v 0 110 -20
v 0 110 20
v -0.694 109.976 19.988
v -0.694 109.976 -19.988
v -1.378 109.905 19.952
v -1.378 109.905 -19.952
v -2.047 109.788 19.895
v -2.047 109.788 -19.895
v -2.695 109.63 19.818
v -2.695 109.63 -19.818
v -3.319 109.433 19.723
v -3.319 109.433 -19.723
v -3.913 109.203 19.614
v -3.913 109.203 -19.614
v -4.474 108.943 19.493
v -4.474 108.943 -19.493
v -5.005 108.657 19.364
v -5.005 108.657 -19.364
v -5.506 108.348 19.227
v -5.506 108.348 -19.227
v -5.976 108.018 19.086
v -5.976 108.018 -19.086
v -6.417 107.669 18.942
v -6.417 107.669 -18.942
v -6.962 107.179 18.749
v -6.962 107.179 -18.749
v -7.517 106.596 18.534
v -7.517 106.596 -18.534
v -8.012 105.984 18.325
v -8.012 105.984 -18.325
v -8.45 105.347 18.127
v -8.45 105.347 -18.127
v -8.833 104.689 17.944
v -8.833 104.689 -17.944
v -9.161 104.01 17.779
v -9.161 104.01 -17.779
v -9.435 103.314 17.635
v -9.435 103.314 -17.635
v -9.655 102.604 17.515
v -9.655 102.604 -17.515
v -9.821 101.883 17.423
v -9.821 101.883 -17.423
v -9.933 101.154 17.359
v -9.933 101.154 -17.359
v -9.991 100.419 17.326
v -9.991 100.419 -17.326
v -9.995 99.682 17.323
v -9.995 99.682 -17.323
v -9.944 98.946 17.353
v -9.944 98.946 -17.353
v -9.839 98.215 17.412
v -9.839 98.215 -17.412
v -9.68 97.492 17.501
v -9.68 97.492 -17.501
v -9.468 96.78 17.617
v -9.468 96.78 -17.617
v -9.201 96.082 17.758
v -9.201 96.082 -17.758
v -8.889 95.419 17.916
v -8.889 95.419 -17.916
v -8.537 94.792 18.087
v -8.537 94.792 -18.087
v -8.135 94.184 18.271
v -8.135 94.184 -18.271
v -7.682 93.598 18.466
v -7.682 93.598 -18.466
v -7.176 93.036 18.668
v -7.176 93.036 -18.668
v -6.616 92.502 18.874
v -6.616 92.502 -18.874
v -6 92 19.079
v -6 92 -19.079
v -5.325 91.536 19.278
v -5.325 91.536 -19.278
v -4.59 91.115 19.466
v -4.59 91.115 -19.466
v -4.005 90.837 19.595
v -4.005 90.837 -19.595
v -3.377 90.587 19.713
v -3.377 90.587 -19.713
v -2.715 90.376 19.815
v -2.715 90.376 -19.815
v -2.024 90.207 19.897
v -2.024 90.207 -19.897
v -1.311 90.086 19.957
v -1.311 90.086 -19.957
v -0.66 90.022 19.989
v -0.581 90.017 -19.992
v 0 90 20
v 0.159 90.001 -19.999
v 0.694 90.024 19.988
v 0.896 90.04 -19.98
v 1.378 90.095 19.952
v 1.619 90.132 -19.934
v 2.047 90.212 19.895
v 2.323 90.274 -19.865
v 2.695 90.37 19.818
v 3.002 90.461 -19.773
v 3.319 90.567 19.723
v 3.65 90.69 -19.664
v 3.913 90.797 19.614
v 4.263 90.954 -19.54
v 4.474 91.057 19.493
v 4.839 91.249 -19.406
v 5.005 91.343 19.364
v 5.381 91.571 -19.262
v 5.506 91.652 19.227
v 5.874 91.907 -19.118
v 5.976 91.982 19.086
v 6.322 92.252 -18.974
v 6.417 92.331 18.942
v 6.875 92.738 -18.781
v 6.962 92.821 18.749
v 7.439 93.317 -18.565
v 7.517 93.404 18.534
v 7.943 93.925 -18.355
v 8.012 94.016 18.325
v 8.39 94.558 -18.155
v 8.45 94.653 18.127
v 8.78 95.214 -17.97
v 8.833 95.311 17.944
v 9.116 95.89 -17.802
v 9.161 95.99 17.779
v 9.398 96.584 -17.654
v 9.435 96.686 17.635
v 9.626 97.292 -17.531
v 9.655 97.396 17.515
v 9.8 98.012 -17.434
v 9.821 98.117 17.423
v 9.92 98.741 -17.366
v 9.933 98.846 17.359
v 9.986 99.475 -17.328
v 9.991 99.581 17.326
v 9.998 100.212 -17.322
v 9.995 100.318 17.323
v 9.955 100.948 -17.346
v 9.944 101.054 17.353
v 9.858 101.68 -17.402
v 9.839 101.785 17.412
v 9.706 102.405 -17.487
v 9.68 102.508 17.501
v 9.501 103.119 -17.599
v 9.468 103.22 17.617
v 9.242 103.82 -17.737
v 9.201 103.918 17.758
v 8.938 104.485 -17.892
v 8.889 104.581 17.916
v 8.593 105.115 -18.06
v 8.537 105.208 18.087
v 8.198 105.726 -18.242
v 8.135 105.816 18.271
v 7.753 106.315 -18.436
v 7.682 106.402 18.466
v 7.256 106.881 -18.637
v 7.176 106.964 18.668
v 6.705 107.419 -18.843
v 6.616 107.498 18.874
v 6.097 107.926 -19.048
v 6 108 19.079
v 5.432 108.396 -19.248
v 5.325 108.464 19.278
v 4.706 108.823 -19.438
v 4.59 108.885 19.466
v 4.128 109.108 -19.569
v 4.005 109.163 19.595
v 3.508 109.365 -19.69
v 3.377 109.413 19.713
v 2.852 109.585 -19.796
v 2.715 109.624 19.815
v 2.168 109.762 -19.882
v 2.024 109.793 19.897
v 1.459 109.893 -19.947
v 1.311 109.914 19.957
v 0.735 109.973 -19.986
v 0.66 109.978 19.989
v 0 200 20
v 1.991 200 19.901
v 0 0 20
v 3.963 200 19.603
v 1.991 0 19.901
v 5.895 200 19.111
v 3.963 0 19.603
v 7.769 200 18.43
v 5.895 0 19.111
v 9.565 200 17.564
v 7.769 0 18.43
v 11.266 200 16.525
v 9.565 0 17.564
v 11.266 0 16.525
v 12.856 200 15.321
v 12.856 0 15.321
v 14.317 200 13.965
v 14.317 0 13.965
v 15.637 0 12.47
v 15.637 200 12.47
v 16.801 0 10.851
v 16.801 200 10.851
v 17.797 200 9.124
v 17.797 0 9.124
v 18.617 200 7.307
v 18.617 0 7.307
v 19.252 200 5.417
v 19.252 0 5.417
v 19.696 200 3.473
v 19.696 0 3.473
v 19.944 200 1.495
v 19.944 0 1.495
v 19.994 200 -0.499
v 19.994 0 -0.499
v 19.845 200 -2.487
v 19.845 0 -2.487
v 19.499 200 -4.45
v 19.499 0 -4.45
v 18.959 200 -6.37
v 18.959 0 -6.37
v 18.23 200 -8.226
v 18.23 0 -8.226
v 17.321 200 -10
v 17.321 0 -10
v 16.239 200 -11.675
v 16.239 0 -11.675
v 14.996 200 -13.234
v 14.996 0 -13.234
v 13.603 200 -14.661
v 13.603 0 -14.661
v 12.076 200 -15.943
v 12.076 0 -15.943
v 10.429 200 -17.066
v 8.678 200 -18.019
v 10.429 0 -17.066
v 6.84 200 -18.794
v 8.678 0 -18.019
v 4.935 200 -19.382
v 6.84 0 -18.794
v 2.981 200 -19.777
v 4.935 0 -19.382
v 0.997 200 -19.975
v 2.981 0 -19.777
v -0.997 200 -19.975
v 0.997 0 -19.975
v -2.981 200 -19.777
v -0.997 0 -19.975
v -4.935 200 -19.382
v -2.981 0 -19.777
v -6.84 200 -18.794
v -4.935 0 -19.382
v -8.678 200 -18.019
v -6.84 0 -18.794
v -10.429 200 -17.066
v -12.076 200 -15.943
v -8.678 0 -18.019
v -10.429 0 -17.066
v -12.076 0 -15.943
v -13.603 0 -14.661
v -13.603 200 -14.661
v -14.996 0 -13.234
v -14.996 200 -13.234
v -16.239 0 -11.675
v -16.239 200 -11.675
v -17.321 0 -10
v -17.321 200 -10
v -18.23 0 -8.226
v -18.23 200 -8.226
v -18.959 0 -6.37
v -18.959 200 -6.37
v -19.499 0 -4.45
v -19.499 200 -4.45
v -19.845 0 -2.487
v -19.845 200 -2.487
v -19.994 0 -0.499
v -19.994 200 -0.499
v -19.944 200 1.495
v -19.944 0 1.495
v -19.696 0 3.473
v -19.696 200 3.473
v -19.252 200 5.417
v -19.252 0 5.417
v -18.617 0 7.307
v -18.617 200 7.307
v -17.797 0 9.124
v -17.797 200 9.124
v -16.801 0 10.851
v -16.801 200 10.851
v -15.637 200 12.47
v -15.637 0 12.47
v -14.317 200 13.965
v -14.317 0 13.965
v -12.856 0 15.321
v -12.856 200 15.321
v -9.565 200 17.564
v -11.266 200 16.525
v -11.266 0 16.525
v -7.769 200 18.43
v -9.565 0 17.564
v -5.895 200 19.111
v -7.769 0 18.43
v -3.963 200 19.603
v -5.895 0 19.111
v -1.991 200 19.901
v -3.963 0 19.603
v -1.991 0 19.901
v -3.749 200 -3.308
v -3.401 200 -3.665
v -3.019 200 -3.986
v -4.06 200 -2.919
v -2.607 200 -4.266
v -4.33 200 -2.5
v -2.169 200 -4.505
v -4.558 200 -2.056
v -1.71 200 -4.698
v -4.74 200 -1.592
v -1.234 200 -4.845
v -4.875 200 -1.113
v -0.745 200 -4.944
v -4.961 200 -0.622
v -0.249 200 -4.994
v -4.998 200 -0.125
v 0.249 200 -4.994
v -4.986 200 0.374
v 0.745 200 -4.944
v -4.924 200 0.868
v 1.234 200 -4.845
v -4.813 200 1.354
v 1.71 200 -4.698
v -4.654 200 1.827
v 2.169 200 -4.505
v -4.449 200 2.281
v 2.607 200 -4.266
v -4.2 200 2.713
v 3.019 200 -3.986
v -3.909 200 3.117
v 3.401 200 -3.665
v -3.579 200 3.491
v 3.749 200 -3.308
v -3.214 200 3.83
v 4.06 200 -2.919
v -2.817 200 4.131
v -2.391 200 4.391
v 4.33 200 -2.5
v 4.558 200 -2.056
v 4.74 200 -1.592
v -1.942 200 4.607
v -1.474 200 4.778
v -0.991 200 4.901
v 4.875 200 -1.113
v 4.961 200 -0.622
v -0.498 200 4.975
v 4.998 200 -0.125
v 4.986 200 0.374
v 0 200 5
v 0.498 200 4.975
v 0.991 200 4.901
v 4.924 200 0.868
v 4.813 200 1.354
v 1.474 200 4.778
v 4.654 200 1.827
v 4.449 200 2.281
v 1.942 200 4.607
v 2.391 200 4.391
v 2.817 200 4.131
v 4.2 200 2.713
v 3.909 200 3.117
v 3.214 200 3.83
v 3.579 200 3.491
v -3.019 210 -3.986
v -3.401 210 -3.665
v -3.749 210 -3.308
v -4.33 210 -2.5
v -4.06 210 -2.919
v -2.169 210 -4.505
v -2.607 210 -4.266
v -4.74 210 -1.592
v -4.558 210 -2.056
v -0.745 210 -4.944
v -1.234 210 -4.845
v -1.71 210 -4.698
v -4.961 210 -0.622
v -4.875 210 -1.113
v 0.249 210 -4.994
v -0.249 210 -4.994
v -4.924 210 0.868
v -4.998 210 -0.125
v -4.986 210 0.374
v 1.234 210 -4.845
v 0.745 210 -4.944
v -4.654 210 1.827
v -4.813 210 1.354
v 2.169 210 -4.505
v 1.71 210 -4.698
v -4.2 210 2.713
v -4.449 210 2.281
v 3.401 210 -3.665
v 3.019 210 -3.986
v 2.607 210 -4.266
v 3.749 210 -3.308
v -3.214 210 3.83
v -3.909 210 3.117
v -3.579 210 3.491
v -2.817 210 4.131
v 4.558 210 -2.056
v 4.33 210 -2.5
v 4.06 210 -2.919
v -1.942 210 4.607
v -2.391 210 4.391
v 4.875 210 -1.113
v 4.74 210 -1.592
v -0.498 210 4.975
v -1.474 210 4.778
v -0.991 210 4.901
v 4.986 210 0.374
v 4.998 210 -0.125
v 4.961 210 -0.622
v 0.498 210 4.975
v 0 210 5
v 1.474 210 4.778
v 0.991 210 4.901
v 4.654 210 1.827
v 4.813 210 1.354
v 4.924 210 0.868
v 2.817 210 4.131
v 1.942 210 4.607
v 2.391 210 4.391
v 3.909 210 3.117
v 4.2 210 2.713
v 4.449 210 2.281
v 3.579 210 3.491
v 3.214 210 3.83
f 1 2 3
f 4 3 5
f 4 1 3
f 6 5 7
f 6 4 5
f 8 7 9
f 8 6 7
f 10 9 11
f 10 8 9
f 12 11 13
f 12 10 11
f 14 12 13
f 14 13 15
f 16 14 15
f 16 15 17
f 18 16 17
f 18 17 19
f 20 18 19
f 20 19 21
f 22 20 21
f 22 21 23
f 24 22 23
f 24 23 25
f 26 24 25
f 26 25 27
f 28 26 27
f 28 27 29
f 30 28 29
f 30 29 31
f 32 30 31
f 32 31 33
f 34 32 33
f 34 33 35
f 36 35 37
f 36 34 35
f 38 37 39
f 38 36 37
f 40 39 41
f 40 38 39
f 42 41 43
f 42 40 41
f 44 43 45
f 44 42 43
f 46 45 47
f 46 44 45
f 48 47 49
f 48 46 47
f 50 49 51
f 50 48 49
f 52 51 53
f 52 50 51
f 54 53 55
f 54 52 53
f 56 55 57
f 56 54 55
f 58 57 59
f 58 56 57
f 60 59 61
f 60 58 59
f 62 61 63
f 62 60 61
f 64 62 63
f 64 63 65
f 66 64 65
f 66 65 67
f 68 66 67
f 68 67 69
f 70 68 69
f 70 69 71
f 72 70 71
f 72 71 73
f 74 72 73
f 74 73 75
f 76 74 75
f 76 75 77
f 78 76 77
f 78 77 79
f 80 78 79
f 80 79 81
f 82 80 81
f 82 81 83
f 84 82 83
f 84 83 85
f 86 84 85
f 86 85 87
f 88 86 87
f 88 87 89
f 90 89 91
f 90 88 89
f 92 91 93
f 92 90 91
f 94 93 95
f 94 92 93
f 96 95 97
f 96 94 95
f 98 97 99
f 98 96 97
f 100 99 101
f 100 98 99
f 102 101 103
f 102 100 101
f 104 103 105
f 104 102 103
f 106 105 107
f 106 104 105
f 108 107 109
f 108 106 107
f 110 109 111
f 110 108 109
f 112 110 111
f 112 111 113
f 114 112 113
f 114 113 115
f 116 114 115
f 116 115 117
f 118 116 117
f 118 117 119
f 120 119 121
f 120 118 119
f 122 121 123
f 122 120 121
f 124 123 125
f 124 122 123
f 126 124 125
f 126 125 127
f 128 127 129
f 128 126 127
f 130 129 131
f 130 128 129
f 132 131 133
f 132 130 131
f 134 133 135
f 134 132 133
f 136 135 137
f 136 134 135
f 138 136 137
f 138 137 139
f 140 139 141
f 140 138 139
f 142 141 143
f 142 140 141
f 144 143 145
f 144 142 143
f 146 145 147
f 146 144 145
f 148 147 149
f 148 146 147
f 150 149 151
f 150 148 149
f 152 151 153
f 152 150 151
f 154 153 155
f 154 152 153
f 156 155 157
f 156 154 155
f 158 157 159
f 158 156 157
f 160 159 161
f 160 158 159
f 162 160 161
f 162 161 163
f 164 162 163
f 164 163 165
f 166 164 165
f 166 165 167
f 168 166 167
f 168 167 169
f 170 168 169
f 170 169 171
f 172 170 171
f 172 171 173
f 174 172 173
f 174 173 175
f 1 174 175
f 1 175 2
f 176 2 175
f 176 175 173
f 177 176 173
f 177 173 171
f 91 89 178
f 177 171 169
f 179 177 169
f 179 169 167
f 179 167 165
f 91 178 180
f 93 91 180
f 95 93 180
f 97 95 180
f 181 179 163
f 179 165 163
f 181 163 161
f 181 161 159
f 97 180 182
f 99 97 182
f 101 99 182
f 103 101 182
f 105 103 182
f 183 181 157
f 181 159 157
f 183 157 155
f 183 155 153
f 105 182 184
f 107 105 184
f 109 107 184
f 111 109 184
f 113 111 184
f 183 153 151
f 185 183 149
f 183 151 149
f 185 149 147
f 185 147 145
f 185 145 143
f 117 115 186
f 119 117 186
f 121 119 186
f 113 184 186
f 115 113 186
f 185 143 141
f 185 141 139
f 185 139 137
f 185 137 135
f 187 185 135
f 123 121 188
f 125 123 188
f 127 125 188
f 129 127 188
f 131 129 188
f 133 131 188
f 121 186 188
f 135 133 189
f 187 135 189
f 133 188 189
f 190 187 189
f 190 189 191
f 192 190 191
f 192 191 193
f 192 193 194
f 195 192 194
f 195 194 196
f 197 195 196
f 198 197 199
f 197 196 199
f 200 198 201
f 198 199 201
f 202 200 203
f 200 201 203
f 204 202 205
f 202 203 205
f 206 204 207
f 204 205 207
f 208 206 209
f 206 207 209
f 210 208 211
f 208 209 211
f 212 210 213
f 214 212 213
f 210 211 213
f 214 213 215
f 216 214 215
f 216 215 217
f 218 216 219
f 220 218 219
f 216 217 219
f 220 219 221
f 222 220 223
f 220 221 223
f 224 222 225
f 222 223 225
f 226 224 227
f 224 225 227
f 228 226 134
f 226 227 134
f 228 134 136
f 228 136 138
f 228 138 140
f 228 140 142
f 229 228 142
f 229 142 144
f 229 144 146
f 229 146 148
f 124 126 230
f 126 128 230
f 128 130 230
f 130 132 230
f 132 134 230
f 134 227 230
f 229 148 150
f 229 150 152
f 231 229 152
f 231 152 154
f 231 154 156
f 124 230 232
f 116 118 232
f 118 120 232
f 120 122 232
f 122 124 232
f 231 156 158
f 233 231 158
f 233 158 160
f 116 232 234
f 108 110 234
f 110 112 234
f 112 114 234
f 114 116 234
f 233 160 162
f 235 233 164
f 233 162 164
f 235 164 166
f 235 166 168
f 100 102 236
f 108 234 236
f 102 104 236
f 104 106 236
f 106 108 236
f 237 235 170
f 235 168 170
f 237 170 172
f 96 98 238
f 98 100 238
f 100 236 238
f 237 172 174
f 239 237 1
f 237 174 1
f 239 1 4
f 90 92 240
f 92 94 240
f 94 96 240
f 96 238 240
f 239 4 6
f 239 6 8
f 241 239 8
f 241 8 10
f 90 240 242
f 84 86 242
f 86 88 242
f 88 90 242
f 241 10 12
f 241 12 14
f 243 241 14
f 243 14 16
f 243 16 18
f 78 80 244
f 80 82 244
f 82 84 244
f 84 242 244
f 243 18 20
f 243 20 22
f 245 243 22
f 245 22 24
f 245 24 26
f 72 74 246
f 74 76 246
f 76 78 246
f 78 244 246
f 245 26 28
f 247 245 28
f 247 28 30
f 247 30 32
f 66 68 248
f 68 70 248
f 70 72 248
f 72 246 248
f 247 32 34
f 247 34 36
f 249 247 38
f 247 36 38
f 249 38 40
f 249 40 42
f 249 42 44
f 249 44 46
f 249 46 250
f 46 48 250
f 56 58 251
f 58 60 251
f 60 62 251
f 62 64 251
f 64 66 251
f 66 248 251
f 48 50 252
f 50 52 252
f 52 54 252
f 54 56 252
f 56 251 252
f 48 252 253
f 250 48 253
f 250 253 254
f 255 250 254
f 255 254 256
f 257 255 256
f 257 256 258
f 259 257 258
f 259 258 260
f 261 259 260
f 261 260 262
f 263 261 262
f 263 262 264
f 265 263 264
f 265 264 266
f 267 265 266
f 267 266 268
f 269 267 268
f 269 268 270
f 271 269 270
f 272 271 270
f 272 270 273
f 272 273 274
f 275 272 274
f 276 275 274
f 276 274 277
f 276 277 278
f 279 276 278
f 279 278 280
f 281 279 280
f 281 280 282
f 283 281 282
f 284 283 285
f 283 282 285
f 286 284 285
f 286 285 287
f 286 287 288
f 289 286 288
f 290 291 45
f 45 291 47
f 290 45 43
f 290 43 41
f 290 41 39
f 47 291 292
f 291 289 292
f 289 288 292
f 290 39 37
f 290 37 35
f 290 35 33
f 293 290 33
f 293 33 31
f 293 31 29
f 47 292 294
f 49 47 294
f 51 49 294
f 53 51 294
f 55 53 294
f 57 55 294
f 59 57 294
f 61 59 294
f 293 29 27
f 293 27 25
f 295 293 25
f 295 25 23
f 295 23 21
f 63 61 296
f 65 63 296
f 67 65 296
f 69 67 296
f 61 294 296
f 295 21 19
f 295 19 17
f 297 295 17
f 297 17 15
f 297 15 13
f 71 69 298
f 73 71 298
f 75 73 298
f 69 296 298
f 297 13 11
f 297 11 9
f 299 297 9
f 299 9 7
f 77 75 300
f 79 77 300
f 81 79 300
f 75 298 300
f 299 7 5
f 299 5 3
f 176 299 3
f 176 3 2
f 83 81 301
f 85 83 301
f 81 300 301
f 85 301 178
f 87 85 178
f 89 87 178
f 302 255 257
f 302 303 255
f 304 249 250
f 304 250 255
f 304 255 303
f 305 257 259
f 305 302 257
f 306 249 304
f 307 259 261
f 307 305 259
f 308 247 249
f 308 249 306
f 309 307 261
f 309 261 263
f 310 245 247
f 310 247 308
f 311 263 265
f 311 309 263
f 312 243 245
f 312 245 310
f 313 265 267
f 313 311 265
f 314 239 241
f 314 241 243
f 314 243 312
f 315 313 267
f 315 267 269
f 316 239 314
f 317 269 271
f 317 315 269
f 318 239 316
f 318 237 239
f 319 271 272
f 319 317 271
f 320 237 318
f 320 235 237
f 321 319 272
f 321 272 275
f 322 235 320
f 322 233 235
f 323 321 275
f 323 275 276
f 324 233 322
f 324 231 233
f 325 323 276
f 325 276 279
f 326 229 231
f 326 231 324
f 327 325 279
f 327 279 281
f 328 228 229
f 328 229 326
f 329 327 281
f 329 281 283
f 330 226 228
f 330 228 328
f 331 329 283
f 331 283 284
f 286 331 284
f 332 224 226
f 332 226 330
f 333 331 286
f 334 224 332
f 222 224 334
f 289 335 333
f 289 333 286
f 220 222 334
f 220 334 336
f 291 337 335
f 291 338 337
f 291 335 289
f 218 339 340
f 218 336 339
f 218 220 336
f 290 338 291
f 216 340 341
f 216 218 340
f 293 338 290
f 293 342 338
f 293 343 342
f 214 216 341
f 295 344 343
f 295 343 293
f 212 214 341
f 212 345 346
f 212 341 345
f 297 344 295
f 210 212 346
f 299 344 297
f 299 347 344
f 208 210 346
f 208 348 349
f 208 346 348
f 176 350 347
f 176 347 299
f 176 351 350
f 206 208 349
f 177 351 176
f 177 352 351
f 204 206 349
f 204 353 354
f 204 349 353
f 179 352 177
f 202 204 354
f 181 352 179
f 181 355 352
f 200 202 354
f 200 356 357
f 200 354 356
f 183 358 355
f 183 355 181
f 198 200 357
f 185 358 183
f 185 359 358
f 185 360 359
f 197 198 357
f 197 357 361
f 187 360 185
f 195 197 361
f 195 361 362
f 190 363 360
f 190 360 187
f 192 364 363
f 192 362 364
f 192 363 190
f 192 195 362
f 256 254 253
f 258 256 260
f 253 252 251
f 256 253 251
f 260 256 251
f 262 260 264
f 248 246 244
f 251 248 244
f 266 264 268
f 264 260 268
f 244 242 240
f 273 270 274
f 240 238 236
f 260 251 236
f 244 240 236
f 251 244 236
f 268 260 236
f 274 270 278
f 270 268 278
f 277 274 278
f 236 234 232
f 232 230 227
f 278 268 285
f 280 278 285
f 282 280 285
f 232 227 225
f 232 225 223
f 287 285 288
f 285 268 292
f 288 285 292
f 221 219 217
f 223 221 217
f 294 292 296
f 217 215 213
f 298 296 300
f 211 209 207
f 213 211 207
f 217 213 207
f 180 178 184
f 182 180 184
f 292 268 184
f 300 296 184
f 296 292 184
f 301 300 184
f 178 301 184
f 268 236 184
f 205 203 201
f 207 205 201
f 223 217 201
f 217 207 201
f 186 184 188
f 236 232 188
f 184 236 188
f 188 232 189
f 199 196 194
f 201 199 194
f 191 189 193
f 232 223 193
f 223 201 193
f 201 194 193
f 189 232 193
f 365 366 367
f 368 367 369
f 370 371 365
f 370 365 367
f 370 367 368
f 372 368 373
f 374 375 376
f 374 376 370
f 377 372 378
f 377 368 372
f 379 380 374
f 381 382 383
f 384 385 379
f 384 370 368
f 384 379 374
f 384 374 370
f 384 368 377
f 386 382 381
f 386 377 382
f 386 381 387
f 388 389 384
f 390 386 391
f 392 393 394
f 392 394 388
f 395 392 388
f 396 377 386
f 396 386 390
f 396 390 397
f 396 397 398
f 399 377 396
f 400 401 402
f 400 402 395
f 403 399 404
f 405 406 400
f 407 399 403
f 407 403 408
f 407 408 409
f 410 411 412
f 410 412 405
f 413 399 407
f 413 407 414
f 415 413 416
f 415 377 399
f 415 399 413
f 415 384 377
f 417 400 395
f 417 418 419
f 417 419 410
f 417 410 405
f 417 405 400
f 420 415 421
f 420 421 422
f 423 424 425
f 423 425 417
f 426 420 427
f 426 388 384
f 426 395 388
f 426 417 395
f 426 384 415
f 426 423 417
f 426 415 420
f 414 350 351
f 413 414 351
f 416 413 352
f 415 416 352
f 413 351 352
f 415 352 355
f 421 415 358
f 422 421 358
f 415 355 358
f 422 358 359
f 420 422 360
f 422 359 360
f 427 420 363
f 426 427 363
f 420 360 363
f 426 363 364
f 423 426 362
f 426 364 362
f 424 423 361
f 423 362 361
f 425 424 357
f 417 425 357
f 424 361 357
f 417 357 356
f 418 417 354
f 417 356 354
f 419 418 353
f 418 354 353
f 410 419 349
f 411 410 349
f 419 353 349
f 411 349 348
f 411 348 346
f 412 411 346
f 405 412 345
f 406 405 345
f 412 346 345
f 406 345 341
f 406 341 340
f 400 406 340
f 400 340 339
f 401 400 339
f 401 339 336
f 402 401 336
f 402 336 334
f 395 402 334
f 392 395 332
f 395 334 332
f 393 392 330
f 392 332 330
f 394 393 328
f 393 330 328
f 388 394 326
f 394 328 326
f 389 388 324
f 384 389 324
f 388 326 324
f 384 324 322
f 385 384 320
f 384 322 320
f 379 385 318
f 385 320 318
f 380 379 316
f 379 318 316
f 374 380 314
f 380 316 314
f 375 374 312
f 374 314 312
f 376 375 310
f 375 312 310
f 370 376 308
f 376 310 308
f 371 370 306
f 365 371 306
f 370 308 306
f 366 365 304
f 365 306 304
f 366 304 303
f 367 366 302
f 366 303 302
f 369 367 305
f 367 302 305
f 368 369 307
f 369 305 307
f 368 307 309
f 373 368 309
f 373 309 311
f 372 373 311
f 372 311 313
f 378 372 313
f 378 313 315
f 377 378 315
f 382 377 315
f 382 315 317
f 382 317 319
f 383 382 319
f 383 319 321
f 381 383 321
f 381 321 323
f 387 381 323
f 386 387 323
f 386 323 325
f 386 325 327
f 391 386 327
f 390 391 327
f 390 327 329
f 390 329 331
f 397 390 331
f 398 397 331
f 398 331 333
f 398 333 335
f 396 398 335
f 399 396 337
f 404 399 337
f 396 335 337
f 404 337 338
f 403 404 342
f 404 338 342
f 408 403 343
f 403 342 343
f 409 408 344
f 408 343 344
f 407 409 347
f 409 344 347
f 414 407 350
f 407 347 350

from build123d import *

# Parameters (mm, degrees)
SKETCH1_R               = 20
BOSS_EXTRUDE1_DEPTH     = 200
CUT_EXTRUDE1_DEPTH      = 202.990098767
CUT_EXTRUDE1_DEPTH_BACK = 200
SKETCH2_R               = 10
SKETCH5_R               = 5
BOSS_EXTRUDE4_DEPTH     = 10


with BuildPart() as part:
    # Sketch1 → Boss-Extrude1 (new body)
    with BuildSketch(Plane(origin=(0, 0, 0), x_dir=(1, 0, 0), z_dir=(0, 1, 0))):
        with Locations(Location((0, 0, 0), (0, 0, 270))):
            Circle(SKETCH1_R)
    extrude(amount=BOSS_EXTRUDE1_DEPTH)

    # Sketch2 → Cut-Extrude1 (cut, two sides: drawn at the far end of the back side and taken through both)
    with BuildSketch(Plane.XY.offset(-CUT_EXTRUDE1_DEPTH_BACK)):
        with Locations(Location((0, 100, 0), (0, 0, 90))):
            Circle(SKETCH2_R)
    extrude(amount=CUT_EXTRUDE1_DEPTH + CUT_EXTRUDE1_DEPTH_BACK, mode=Mode.SUBTRACT)

    # Sketch5 → Boss-Extrude4 (add)
    with BuildSketch(Plane(origin=(0, 200, 0), x_dir=(1, 0, 0), z_dir=(0, 1, 0))):
        with Locations(Location((0, 0, 0), (0, 0, 270))):
            Circle(SKETCH5_R)
    extrude(amount=BOSS_EXTRUDE4_DEPTH)


solid = part.part
